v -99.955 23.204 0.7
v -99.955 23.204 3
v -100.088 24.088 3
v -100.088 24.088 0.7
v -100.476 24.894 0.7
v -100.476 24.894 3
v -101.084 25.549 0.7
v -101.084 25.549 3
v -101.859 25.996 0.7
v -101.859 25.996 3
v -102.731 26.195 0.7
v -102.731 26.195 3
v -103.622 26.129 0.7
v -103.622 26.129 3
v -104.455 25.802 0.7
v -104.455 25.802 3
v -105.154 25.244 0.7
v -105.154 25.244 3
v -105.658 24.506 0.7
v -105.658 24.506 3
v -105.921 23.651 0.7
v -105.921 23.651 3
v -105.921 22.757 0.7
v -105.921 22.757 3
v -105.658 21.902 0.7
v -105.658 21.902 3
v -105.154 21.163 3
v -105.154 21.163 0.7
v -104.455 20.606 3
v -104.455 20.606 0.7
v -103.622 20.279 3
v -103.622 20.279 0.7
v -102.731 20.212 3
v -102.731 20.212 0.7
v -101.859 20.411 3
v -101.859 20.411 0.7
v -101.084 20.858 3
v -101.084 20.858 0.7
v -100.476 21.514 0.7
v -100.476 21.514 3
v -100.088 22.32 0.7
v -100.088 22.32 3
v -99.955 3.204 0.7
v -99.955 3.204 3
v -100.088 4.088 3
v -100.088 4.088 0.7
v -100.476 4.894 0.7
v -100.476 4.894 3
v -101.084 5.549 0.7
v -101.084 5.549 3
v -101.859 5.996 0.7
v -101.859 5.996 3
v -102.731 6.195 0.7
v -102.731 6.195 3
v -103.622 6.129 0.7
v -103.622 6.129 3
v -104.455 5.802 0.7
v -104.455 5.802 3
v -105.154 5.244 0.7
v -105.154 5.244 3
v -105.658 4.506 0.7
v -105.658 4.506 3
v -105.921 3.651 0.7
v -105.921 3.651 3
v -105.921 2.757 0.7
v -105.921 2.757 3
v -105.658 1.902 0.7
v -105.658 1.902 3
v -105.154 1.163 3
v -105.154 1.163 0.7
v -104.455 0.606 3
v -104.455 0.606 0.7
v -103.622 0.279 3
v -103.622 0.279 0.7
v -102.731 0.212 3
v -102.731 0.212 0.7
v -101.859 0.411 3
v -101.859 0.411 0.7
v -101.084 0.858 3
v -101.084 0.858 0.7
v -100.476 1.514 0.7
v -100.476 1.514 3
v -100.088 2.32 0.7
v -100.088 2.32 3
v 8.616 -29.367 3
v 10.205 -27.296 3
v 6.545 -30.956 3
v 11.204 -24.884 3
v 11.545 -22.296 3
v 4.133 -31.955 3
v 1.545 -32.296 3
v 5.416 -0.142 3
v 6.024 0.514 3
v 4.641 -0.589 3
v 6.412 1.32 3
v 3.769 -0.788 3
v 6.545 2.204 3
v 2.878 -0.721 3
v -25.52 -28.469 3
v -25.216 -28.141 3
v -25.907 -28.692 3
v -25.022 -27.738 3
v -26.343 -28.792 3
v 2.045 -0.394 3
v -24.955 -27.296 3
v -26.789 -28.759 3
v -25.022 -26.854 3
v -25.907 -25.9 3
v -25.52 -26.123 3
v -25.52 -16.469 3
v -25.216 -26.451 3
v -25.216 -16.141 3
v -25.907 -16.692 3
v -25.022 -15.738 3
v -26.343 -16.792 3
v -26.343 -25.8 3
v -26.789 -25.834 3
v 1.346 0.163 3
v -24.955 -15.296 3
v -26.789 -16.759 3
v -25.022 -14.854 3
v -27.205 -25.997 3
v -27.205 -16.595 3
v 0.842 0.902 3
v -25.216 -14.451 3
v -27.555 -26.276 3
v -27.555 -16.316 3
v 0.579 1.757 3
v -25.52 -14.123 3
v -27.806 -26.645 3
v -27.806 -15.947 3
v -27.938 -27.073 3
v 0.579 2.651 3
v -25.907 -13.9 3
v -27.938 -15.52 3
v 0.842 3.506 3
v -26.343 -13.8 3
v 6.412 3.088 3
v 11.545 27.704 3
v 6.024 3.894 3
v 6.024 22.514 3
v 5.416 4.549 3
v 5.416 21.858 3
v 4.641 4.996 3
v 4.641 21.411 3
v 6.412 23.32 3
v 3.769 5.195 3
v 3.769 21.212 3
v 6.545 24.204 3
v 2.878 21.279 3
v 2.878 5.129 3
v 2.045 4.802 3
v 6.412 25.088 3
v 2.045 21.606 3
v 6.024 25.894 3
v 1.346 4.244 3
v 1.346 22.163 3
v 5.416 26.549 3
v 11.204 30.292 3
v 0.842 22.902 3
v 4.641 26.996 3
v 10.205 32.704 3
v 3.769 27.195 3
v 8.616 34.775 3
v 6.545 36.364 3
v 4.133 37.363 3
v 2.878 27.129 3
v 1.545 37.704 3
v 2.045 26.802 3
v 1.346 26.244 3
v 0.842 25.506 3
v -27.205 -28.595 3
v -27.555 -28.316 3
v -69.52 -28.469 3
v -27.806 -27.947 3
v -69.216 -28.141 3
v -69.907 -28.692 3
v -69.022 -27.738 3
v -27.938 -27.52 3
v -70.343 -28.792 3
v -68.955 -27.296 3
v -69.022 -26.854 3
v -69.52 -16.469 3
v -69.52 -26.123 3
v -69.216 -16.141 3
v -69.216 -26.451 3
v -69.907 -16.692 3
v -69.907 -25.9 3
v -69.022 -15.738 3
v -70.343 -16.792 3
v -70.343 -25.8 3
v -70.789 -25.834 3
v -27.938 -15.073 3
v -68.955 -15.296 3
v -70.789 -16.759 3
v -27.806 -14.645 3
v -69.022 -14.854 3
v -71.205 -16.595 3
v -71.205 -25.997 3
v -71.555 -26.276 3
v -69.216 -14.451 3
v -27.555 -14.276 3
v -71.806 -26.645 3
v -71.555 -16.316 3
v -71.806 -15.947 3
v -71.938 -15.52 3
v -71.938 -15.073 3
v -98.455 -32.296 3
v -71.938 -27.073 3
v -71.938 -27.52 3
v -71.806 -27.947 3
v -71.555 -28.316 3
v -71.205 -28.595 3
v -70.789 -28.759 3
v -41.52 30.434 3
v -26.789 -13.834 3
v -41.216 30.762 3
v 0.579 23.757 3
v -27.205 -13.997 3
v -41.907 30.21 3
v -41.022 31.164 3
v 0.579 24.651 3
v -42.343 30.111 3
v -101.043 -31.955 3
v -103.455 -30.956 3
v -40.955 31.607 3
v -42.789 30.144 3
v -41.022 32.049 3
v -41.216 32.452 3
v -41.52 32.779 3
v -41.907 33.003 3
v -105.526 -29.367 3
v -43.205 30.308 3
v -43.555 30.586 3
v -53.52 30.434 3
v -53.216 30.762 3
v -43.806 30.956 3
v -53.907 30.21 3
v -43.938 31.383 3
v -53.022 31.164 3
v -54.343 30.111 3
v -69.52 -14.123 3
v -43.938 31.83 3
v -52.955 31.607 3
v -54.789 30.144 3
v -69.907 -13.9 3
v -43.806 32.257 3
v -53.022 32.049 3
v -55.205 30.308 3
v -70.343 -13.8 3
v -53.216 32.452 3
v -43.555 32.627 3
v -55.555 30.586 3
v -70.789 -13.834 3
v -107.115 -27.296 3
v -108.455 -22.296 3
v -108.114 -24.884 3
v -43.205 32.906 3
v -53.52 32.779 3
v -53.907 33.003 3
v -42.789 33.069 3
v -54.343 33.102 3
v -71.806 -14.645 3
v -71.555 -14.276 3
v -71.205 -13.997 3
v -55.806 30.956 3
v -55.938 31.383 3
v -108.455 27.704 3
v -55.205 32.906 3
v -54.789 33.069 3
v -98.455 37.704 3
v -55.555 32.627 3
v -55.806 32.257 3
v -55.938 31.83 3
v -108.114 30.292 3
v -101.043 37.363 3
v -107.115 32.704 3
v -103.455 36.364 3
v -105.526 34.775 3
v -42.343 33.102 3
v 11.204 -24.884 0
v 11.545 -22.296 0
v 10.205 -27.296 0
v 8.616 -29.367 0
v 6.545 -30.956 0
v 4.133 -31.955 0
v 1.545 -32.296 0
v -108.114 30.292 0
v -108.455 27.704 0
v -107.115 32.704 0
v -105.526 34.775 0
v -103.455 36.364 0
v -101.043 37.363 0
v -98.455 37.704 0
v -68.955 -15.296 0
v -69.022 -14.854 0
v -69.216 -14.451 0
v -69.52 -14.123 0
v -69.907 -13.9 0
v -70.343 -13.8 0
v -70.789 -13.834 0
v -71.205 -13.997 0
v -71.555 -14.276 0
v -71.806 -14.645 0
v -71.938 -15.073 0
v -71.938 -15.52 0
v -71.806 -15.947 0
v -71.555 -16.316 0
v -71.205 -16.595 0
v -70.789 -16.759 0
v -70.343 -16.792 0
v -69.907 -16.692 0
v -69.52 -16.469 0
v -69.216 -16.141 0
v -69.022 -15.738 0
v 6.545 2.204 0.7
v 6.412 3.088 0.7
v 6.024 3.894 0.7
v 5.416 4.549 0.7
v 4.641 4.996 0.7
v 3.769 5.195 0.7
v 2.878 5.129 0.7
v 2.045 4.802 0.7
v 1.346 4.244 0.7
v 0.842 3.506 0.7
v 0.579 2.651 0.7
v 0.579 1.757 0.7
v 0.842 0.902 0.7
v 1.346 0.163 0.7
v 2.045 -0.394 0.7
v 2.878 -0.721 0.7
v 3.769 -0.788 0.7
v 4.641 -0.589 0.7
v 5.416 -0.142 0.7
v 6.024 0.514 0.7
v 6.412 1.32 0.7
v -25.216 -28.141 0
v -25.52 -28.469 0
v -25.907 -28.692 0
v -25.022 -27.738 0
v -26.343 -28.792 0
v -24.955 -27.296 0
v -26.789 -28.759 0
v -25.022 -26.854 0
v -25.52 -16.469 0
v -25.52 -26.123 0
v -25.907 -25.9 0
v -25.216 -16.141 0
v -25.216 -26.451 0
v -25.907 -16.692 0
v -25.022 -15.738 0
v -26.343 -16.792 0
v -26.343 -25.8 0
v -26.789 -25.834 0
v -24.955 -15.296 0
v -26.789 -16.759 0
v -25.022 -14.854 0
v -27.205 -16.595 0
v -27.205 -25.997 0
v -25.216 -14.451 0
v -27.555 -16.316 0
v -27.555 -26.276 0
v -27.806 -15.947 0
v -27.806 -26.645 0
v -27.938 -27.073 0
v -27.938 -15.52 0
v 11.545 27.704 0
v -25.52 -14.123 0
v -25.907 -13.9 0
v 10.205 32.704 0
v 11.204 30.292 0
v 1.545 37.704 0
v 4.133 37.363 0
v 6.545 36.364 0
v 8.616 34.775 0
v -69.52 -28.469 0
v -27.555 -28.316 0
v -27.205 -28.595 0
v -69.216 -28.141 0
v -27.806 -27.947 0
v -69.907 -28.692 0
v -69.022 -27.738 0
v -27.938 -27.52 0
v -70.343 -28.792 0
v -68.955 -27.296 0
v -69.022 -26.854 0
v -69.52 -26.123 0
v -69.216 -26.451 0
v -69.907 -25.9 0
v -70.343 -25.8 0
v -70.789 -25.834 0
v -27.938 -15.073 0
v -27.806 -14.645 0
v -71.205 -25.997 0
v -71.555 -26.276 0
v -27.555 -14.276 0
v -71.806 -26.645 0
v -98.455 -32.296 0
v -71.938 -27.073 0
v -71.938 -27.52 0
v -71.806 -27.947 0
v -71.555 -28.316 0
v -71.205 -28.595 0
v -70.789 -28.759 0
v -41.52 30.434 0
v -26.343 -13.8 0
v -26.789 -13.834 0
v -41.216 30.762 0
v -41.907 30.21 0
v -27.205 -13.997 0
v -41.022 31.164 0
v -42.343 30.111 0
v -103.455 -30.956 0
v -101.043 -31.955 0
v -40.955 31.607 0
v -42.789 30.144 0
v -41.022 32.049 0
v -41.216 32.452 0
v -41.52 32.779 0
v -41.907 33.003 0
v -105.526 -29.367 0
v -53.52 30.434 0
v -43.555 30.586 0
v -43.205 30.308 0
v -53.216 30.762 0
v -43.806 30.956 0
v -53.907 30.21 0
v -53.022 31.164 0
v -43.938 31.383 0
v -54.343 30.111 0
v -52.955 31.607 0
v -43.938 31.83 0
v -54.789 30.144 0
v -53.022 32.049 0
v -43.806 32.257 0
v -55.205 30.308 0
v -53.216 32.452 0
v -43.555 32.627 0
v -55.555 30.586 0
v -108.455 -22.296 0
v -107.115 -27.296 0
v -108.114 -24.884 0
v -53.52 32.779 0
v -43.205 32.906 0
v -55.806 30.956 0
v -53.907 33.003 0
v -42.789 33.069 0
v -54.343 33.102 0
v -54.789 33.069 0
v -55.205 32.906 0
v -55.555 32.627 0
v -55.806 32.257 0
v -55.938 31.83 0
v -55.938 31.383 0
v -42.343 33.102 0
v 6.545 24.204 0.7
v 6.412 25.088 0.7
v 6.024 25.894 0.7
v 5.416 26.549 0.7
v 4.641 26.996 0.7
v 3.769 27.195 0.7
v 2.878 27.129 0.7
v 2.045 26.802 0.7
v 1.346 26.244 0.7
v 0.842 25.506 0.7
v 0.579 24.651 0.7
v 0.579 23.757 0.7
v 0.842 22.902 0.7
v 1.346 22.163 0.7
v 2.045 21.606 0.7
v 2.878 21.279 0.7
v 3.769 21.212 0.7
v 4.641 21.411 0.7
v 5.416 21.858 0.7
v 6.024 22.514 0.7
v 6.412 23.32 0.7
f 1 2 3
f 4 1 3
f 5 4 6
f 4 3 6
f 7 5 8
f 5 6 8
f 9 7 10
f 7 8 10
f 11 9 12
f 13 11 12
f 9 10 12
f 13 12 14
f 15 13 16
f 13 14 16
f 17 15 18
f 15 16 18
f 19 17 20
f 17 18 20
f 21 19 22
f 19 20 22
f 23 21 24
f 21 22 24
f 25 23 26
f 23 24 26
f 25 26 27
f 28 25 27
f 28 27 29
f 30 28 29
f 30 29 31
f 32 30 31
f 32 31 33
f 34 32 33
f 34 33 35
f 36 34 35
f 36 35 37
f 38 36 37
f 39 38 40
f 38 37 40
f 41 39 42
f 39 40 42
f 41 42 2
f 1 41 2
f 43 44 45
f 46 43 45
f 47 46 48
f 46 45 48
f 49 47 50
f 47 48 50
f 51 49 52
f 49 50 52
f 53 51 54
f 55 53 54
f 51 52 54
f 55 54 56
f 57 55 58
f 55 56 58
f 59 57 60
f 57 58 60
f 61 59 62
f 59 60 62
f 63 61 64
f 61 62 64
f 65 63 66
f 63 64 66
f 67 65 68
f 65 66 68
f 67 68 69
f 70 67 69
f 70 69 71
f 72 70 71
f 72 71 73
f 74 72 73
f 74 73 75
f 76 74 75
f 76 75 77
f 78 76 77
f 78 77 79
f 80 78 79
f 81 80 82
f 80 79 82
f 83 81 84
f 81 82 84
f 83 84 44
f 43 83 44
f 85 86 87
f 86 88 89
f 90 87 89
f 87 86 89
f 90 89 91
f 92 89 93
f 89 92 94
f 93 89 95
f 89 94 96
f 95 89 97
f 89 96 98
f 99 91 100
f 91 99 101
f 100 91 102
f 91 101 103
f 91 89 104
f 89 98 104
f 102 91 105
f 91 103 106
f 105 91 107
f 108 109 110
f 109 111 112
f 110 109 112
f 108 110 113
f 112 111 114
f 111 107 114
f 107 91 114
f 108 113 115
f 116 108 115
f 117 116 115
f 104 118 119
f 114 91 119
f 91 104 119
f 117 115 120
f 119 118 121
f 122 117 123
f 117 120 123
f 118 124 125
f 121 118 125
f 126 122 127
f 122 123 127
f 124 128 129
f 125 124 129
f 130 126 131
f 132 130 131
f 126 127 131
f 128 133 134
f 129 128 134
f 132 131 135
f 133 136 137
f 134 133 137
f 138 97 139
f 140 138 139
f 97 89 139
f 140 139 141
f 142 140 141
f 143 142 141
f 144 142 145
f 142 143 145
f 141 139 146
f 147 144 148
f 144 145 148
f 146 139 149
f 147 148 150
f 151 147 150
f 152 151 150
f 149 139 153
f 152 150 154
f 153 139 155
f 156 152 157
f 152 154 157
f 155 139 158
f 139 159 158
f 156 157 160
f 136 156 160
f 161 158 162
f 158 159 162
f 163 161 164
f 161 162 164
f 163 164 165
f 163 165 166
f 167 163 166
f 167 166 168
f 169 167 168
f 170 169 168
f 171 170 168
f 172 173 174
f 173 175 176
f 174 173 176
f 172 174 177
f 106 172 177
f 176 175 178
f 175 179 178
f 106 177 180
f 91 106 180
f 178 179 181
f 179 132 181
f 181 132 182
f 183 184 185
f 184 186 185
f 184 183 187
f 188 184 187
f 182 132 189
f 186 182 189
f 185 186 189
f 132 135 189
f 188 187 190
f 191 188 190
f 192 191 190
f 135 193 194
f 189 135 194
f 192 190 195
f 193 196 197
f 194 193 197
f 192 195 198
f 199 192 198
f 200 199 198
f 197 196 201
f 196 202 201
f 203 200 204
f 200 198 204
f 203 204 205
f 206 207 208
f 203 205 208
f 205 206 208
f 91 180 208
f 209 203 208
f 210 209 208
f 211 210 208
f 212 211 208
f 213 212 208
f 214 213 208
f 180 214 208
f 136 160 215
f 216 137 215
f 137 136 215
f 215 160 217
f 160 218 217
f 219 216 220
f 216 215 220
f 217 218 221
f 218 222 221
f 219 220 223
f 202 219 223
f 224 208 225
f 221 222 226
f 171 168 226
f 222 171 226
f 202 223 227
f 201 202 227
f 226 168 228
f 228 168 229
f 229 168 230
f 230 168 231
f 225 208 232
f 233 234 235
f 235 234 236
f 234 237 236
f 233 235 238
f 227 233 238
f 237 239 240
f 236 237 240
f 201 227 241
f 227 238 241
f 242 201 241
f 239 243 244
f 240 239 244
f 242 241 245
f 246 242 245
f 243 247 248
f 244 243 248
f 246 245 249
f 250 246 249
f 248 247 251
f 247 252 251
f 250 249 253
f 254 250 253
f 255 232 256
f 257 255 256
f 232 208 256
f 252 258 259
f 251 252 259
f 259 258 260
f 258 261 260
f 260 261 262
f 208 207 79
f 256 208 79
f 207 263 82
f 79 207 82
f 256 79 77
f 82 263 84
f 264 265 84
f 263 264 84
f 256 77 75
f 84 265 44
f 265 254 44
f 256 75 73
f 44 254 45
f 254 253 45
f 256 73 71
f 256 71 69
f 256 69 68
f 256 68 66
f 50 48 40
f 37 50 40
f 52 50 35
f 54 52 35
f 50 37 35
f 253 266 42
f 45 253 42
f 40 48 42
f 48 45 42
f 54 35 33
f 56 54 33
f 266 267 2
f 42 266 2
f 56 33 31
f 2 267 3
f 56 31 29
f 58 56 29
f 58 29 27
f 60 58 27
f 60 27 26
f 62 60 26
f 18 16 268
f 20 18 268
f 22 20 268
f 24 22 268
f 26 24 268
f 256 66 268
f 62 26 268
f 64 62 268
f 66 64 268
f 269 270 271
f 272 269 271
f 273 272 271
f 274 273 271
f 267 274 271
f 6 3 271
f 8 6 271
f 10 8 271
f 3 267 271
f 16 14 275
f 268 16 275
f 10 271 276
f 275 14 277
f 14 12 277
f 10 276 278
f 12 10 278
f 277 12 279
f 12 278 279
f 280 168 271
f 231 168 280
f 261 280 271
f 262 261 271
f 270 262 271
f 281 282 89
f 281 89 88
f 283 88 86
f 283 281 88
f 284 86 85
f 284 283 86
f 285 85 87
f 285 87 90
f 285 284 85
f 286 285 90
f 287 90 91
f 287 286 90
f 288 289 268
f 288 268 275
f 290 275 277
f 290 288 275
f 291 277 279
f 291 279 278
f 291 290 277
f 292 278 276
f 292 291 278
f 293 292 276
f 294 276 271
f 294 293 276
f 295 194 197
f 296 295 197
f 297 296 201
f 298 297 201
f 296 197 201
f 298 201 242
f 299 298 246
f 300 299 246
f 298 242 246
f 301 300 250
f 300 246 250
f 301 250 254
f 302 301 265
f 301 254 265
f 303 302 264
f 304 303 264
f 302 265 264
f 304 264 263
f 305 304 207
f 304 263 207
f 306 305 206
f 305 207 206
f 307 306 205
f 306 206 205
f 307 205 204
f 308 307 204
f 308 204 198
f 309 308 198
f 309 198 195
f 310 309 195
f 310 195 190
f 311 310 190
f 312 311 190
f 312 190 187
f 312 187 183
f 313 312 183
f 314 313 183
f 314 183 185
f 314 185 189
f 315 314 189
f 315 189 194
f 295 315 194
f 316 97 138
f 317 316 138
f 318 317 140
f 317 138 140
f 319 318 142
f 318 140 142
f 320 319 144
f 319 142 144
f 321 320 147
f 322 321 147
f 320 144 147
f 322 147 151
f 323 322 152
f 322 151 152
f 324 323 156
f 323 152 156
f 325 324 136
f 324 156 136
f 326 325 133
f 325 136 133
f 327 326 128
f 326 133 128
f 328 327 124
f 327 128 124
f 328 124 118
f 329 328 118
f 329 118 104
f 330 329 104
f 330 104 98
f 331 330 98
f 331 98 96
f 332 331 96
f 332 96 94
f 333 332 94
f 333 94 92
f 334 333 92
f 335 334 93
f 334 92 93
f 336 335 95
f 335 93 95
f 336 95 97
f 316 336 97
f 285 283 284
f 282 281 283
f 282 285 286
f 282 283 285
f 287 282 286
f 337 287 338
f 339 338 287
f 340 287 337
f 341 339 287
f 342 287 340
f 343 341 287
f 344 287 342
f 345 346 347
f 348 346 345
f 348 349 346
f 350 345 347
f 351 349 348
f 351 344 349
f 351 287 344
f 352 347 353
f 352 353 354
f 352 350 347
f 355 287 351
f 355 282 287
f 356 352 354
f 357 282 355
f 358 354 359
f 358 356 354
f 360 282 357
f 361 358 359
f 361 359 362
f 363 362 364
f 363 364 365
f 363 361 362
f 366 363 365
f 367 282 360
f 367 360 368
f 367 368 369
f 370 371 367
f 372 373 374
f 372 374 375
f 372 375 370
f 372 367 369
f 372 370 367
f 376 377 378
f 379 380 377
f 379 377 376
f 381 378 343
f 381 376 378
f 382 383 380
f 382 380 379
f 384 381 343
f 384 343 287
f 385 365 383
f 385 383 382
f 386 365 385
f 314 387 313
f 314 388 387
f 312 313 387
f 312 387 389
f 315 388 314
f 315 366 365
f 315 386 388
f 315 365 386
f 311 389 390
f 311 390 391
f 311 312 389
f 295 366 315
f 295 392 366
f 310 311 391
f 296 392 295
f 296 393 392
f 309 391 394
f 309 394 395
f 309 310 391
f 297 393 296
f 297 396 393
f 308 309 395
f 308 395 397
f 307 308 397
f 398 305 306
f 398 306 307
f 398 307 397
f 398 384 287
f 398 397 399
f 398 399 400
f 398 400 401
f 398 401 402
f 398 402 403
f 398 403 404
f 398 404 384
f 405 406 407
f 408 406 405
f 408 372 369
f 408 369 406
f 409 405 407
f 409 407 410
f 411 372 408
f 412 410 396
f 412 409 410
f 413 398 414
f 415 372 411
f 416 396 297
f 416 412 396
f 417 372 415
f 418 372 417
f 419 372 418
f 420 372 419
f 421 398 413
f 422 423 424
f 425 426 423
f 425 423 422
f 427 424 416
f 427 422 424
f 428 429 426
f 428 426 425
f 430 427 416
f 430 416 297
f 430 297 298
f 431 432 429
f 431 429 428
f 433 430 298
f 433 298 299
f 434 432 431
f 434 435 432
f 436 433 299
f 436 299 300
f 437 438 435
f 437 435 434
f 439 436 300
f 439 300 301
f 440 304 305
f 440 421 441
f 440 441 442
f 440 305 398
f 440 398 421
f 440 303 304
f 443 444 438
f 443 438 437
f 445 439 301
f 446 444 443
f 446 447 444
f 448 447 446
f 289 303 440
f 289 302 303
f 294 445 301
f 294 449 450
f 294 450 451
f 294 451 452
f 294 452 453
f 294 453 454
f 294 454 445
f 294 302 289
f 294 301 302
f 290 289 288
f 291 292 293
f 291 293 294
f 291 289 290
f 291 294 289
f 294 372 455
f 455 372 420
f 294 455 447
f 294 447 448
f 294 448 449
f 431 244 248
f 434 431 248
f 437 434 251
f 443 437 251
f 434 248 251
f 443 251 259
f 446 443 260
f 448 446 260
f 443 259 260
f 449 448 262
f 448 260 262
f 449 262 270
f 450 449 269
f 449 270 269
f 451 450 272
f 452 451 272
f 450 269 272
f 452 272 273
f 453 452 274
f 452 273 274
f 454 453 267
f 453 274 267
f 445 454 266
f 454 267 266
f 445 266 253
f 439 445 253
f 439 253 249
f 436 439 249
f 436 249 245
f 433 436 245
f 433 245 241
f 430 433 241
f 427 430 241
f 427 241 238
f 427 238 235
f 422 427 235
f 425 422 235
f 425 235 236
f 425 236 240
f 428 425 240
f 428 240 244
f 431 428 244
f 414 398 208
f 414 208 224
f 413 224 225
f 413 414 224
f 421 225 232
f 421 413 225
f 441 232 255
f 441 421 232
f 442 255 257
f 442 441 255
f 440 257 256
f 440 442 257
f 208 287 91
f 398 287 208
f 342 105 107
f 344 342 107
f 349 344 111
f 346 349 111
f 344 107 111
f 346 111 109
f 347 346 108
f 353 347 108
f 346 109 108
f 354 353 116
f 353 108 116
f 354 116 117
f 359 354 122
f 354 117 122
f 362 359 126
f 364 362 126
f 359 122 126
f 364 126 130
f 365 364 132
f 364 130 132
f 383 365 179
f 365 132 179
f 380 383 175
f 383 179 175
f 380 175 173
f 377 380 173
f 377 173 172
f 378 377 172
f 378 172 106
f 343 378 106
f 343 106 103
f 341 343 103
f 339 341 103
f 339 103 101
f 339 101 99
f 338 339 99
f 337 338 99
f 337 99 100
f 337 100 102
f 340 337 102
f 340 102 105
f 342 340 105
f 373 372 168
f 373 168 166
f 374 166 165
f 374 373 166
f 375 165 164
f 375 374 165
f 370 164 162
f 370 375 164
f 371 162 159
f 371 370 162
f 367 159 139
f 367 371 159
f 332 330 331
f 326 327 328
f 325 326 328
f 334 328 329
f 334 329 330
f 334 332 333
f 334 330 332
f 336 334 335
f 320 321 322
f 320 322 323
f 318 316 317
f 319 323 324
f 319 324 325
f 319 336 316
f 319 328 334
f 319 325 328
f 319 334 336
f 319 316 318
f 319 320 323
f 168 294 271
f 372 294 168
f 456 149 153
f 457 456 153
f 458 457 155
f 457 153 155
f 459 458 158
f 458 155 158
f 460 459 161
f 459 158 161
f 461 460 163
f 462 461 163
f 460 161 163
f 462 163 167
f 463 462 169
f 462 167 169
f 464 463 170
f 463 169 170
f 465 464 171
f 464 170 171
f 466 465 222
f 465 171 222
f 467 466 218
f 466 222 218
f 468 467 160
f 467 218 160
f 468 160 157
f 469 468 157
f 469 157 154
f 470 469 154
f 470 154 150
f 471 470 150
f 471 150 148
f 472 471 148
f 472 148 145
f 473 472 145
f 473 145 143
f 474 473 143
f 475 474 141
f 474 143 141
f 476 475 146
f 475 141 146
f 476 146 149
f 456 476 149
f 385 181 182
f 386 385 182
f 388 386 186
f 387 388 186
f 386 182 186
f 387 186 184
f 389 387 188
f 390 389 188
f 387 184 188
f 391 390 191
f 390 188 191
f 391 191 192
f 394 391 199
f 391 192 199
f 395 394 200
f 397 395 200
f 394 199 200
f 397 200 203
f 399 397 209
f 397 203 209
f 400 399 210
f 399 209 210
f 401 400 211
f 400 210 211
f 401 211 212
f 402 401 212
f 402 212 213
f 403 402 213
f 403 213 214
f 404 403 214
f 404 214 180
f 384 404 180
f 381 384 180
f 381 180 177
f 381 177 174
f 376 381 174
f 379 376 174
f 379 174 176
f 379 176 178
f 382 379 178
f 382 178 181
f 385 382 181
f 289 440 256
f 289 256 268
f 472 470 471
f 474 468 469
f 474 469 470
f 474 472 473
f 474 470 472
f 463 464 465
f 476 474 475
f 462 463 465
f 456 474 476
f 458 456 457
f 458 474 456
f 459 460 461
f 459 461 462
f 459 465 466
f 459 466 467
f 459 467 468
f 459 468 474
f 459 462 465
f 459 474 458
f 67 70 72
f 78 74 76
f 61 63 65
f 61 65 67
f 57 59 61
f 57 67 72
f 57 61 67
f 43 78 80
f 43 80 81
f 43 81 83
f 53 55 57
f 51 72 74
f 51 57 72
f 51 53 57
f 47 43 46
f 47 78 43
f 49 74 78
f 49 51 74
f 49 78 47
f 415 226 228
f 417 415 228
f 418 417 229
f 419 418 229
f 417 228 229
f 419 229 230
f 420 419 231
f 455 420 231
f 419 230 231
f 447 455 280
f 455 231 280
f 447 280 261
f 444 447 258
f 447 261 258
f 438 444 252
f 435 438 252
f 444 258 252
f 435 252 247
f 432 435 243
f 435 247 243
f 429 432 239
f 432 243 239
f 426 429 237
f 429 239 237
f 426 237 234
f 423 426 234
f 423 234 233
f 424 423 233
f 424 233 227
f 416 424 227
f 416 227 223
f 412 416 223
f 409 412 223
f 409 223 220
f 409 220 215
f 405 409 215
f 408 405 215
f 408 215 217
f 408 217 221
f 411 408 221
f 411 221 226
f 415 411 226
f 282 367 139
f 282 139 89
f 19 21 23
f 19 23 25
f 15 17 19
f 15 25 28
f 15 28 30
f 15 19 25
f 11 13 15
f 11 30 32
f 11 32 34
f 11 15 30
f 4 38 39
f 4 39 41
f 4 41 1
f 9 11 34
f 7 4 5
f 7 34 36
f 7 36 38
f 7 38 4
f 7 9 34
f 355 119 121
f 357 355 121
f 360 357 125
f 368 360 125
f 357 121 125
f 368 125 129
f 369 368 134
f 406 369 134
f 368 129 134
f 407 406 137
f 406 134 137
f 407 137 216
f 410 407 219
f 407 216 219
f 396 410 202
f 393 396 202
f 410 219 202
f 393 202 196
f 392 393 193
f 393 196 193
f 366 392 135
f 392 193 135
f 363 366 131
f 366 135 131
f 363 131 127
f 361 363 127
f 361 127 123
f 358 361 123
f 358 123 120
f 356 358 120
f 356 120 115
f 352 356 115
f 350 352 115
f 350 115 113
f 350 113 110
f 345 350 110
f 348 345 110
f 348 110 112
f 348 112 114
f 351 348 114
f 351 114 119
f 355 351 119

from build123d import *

# Parameters (mm, degrees)
BOSS_EXTRUDE1_DEPTH = 3
SKETCH2_R           = 1.5
CUT_EXTRUDE1_DEPTH  = 115.861021763
SKETCH3_R           = 3
CUT_EXTRUDE2_DEPTH  = 2.3


with BuildPart() as part:
    # Sketch1 → Boss-Extrude1 (new body)
    with BuildSketch(Plane.XY):
        with BuildLine():
            Line((-98.454935622, 37.703862661), (1.545064378, 37.703862661))
            ThreePointArc((1.545064378, 37.703862661), (8.61613219, 34.774930473), (11.545064378, 27.703862661))
            Line((11.545064378, 27.703862661), (11.545064378, -22.296137339))
            ThreePointArc((11.545064378, -22.296137339), (8.61613219, -29.367205151), (1.545064378, -32.296137339))
            Line((1.545064378, -32.296137339), (-98.454935622, -32.296137339))
            ThreePointArc((-98.454935622, -32.296137339), (-105.526003434, -29.367205151), (-108.454935622, -22.296137339))
            Line((-108.454935622, -22.296137339), (-108.454935622, 27.703862661))
            ThreePointArc((-108.454935622, 27.703862661), (-105.526003434, 34.774930473), (-98.454935622, 37.703862661))
        make_face()
    extrude(amount=BOSS_EXTRUDE1_DEPTH)

    # Sketch2 → Cut-Extrude1 (cut, through all)
    with BuildSketch(Plane.XY.offset(3)):
        with Locations((-54.454935622, 31.60657407)):
            Circle(SKETCH2_R)
        with Locations((-42.454935622, 31.60657407)):
            Circle(SKETCH2_R)
        with Locations((-70.454935622, -15.296137339)):
            Circle(SKETCH2_R)
        with Locations((-70.454935622, -27.296137339)):
            Circle(SKETCH2_R)
        with Locations((-26.454935622, -15.296137339)):
            Circle(SKETCH2_R)
        with Locations((-26.454935622, -27.296137339)):
            Circle(SKETCH2_R)
    extrude(amount=-CUT_EXTRUDE1_DEPTH, mode=Mode.SUBTRACT)

    # Sketch3 → Cut-Extrude2 (cut)
    with BuildSketch(Plane.XY.offset(3)):
        with Locations((-102.954935622, 23.203862661)):
            Circle(SKETCH3_R)
        with Locations((-102.954935622, 3.203862661)):
            Circle(SKETCH3_R)
        with Locations((3.545064378, 24.203862661)):
            Circle(SKETCH3_R)
        with Locations((3.545064378, 2.203862661)):
            Circle(SKETCH3_R)
    extrude(amount=-CUT_EXTRUDE2_DEPTH, mode=Mode.SUBTRACT)


solid = part.part
